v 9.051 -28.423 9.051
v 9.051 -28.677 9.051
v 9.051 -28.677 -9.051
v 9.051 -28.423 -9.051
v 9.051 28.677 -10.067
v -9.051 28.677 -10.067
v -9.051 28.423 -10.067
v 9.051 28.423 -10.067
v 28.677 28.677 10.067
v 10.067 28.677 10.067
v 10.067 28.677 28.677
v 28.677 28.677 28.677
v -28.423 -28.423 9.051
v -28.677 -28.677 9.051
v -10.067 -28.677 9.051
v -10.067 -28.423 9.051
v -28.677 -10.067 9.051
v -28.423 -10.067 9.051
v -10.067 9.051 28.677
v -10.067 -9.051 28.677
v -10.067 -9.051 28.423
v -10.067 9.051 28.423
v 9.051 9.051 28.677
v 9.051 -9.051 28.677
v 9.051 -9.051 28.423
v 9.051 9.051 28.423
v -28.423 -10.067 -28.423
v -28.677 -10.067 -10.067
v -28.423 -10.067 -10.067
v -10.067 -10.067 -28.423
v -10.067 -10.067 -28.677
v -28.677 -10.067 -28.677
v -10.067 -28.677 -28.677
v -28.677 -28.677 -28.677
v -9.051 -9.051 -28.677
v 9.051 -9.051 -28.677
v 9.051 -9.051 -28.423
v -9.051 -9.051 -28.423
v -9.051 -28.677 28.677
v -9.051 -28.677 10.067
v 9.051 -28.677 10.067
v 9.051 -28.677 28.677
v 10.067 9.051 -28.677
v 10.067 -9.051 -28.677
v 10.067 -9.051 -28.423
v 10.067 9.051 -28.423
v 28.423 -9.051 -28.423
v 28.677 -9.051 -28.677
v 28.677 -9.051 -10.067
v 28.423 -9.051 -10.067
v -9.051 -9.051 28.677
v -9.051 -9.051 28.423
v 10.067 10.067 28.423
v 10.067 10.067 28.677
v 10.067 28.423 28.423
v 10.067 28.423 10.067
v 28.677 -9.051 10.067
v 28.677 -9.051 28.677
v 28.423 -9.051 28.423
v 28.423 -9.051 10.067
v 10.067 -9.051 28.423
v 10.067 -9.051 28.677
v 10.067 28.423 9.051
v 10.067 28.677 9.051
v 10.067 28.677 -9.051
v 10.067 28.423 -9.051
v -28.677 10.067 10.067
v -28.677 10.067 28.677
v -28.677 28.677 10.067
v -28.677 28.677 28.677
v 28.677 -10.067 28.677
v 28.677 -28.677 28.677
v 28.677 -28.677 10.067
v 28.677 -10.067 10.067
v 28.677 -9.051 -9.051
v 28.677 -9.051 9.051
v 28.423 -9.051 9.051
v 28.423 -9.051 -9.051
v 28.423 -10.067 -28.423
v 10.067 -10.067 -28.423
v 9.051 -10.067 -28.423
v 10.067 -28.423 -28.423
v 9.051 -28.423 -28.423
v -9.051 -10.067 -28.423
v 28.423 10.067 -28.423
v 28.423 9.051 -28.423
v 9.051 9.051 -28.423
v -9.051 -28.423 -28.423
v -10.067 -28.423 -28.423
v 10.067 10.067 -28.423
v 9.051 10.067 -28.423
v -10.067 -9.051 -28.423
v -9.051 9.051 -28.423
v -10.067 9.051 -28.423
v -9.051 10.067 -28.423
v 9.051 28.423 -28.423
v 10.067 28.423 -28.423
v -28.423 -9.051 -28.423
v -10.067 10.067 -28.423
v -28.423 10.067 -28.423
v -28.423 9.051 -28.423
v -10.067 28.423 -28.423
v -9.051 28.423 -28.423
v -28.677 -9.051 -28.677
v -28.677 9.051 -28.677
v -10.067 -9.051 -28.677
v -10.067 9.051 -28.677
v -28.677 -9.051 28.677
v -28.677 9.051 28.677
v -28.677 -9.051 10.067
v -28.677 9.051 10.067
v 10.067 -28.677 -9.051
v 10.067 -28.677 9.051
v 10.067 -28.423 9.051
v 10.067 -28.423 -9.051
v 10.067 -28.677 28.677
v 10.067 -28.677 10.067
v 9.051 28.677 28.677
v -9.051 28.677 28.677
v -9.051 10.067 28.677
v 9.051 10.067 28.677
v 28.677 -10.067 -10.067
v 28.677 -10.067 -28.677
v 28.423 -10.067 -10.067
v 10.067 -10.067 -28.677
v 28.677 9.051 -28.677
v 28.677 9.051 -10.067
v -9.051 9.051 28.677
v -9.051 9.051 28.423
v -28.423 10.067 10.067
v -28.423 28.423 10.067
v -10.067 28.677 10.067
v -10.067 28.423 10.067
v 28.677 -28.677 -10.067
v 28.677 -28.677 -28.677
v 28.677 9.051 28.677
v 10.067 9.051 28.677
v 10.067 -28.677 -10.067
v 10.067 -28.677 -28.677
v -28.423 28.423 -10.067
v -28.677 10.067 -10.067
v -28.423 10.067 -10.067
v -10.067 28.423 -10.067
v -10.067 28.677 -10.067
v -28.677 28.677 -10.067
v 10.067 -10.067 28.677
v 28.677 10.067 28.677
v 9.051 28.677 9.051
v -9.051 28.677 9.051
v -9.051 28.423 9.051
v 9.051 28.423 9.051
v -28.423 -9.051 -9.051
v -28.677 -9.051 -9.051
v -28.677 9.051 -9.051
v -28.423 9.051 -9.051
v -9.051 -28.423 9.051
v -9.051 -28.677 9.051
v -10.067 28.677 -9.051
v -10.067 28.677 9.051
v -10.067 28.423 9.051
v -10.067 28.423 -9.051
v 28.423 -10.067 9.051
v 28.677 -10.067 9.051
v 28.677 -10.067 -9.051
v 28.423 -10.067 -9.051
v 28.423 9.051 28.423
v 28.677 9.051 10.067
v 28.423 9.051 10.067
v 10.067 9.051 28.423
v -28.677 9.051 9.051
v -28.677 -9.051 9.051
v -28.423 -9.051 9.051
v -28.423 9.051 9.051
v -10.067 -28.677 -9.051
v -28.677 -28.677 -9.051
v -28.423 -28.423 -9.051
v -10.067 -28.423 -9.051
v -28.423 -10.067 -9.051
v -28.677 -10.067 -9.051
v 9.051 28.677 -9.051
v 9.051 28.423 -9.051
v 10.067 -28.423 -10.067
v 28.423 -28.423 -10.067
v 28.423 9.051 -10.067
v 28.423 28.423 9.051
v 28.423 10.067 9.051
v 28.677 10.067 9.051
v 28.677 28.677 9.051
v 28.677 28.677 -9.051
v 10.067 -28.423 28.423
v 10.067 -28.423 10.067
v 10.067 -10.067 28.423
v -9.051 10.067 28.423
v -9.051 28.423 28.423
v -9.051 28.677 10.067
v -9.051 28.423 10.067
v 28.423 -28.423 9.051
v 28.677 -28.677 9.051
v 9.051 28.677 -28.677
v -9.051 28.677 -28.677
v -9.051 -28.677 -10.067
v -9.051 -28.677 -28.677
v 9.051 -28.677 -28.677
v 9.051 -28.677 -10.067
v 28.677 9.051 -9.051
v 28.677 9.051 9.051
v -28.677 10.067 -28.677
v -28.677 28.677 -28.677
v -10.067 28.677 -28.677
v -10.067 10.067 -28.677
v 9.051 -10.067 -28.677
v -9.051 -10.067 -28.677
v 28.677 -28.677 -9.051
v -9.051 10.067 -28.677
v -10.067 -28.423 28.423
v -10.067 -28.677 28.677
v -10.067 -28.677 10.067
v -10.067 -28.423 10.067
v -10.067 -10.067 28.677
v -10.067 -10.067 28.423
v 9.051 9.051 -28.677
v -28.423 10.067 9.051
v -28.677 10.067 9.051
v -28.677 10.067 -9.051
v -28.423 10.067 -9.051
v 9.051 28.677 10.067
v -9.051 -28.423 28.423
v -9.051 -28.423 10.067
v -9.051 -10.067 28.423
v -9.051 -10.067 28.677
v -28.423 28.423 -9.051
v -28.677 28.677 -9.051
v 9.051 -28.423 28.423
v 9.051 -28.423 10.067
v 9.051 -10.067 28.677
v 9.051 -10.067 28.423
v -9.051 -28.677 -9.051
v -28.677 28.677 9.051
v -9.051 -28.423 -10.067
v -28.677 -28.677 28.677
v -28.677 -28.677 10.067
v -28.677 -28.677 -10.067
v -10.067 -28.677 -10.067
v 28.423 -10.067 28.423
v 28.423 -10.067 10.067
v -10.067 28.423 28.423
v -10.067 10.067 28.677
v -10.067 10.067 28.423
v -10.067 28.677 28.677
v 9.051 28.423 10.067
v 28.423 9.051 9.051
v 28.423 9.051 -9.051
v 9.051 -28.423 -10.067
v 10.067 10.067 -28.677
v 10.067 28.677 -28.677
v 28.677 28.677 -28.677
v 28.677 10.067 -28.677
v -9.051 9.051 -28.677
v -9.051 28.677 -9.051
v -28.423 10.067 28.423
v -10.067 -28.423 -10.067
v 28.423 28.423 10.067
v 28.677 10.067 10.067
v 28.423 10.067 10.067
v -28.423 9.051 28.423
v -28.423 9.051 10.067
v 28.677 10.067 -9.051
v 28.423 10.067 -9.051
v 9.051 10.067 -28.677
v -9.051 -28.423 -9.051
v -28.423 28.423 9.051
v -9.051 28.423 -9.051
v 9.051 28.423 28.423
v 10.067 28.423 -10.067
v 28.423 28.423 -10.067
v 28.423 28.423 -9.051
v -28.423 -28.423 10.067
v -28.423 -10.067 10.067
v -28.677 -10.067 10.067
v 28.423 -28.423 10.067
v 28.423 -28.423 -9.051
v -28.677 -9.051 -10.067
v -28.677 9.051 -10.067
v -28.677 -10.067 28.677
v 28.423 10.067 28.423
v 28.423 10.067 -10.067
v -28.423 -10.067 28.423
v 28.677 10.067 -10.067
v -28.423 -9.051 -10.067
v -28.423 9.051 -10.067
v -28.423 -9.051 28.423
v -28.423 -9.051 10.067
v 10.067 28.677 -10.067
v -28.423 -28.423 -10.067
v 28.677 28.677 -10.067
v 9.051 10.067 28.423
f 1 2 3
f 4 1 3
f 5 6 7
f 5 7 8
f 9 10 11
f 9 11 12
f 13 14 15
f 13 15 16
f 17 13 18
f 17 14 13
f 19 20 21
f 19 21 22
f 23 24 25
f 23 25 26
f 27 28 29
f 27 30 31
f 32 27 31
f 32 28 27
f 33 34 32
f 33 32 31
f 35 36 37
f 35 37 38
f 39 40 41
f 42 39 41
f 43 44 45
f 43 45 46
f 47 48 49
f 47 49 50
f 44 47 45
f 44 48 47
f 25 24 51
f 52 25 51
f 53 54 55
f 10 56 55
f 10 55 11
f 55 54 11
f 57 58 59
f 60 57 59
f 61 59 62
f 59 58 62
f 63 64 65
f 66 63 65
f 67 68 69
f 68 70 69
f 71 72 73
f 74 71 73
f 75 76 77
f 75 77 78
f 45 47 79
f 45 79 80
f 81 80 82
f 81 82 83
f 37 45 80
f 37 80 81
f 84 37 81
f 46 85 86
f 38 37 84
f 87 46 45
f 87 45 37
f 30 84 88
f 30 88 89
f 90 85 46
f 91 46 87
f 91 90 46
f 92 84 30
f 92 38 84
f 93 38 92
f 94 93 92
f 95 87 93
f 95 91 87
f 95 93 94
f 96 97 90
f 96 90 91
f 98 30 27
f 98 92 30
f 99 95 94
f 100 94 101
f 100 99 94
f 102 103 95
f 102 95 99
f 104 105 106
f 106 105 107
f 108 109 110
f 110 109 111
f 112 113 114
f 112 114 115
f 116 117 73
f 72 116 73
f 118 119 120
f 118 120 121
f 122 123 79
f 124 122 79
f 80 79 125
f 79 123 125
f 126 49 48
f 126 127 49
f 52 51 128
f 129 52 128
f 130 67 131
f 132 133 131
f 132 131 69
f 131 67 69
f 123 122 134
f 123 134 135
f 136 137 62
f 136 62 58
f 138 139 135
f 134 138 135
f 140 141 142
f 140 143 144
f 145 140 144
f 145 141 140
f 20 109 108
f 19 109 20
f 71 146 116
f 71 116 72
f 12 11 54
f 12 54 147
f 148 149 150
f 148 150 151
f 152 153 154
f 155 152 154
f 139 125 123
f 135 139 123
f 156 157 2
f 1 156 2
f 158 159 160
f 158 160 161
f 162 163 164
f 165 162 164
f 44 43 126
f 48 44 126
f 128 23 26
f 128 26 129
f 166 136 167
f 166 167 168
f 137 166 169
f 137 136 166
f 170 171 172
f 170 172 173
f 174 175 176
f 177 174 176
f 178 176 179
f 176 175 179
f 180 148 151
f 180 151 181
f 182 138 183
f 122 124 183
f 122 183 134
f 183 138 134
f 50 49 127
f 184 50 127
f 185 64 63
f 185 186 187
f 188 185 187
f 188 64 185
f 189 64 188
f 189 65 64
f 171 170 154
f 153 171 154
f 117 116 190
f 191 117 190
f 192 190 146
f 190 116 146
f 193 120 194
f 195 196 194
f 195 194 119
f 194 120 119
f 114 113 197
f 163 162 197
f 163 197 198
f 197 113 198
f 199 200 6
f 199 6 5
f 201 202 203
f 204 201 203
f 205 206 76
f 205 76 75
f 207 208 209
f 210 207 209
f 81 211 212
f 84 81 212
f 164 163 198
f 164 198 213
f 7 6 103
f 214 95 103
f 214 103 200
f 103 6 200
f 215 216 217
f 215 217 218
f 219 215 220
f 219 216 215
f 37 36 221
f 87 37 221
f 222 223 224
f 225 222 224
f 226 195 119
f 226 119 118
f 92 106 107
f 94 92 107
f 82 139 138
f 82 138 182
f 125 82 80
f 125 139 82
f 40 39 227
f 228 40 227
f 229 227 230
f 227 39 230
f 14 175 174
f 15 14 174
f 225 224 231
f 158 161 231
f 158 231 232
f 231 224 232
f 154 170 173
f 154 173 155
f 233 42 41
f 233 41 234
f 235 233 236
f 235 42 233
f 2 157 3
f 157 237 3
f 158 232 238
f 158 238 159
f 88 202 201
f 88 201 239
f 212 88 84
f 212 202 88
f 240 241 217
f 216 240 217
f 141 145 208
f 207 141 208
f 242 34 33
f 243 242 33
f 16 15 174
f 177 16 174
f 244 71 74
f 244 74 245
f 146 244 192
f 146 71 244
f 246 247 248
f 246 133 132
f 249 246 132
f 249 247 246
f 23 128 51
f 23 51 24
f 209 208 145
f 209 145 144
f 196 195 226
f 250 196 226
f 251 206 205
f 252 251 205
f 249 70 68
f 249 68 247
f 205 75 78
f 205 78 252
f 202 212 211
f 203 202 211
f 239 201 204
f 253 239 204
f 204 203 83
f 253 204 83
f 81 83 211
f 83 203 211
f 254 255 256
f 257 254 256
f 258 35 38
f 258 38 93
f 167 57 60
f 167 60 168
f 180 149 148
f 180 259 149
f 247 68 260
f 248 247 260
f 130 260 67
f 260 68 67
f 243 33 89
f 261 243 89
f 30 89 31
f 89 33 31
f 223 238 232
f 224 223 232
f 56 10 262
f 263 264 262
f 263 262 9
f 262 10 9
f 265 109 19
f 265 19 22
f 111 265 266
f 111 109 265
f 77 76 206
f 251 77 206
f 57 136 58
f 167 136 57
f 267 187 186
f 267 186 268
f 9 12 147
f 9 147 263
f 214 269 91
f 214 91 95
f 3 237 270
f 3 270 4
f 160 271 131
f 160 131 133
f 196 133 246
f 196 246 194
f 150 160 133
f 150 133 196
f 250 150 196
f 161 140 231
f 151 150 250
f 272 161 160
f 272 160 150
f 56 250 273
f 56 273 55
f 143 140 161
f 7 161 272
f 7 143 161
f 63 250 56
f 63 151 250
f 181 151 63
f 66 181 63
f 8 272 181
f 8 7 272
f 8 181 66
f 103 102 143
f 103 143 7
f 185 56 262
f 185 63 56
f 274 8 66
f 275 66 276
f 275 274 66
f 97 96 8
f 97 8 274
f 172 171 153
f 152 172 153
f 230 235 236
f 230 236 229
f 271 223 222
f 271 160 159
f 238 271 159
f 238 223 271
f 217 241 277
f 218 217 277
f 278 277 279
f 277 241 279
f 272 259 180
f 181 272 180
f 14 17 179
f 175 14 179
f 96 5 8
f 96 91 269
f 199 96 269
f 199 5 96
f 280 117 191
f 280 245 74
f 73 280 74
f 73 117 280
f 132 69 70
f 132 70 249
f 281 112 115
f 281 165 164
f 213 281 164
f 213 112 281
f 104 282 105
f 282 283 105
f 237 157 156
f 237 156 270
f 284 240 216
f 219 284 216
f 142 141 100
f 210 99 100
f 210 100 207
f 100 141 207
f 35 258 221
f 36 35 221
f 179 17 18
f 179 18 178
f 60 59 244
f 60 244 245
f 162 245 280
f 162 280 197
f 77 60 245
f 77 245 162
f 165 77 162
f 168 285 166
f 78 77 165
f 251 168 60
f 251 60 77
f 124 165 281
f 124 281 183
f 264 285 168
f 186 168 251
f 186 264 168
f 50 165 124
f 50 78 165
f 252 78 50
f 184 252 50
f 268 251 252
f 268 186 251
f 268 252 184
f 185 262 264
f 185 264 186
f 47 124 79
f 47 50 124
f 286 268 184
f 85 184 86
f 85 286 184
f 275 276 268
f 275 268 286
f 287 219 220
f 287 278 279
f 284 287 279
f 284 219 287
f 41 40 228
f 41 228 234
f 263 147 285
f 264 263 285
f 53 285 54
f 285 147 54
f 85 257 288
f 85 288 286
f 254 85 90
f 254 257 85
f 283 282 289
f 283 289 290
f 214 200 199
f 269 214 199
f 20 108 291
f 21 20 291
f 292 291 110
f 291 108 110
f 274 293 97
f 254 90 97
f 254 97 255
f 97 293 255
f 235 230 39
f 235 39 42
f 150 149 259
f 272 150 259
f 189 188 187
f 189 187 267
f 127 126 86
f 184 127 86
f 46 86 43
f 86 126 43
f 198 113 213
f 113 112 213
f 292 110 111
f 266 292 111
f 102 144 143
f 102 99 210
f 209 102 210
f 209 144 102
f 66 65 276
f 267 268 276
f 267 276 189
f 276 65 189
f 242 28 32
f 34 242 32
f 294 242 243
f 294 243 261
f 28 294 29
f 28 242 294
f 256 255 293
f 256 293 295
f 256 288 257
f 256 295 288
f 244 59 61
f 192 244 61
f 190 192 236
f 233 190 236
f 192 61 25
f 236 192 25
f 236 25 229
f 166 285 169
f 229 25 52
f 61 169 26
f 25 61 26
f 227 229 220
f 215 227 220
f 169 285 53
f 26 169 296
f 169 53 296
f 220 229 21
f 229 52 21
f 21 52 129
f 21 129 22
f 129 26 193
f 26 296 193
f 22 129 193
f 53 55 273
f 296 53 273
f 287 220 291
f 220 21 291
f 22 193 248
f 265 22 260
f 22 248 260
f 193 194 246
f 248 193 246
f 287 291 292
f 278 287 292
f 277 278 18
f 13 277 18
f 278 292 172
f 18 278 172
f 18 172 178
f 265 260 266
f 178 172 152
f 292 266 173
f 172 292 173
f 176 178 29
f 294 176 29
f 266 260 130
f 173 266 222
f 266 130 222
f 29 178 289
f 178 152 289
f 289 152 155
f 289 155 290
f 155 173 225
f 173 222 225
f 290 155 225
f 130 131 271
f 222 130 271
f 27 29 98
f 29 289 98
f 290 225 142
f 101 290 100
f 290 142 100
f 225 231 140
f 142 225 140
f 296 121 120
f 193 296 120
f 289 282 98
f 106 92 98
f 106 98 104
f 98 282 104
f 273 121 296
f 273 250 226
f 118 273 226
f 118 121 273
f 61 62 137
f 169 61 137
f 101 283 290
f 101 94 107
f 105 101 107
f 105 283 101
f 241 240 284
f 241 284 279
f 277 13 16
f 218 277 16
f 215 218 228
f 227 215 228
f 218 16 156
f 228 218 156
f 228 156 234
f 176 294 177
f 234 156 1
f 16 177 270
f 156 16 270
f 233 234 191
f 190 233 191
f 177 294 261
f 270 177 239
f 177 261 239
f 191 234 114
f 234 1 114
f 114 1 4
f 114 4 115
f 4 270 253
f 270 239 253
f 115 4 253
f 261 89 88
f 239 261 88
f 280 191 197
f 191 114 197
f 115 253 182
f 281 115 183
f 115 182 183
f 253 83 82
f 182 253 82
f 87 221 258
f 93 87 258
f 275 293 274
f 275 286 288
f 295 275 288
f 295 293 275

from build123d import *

# Parameters (mm, degrees)
ESQUISSE1_W                     = 57.3532
ESQUISSE1_H                     = 57.3532
BOSS_EXTRU_1_DEPTH              = 28.6766
ESQUISSE2_W                     = 1.016
ESQUISSE2_H                     = 57.3532
ESQUISSE2_W_2                   = 57.3532
ESQUISSE2_H_2                   = 1.016
ENL_V_DE_MAT_EXTRU_MINCE1_DEPTH = 0.254
ESQUISSE3_W                     = 1.016
ESQUISSE3_H                     = 57.3532
ESQUISSE3_W_2                   = 57.3532
ESQUISSE3_H_2                   = 1.016
ENL_V_DE_MAT_EXTRU_MINCE2_DEPTH = 0.254
ESQUISSE4_W                     = 1.016
ESQUISSE4_H                     = 57.3532
ESQUISSE4_W_2                   = 57.3532
ESQUISSE4_H_2                   = 1.016
ENL_V_DE_MAT_EXTRU_MINCE3_DEPTH = 0.254


with BuildPart() as part:
    # Esquisse1 → Boss.-Extru.1 (new, symmetric)
    with BuildSketch(Plane(origin=(0, 0, 0), x_dir=(1, 0, 0), z_dir=(0, 1, 0))):
        Rectangle(ESQUISSE1_W, ESQUISSE1_H)
    extrude(amount=BOSS_EXTRU_1_DEPTH, both=True)

    # Esquisse2 → Enlèv. de mat.-Extru.-Mince1 (cut)
    with BuildSketch(Plane(origin=(0, 28.6766, 0), x_dir=(1, 0, 0), z_dir=(0, 1, 0))):
        with Locations((-9.558866667, 0)):
            Rectangle(ESQUISSE2_W, ESQUISSE2_H)
        with Locations((9.558866667, 0)):
            Rectangle(ESQUISSE2_W, ESQUISSE2_H)
        with Locations((0, 9.558866667)):
            Rectangle(ESQUISSE2_W_2, ESQUISSE2_H_2)
        with Locations((0, -9.558866667)):
            Rectangle(ESQUISSE2_W_2, ESQUISSE2_H_2)
    enl_v_de_mat_extru_mince1 = extrude(amount=-ENL_V_DE_MAT_EXTRU_MINCE1_DEPTH, mode=Mode.SUBTRACT)

    # Esquisse3 → Enlèv. de mat.-Extru.-Mince2 (cut)
    with BuildSketch(Plane(origin=(28.6766, 0, 0), x_dir=(0, 0, -1), z_dir=(1, 0, 0))):
        with Locations((-9.558866667, 0)):
            Rectangle(ESQUISSE3_W, ESQUISSE3_H)
        with Locations((9.558866667, 0)):
            Rectangle(ESQUISSE3_W, ESQUISSE3_H)
        with Locations((0, -9.558866667)):
            Rectangle(ESQUISSE3_W_2, ESQUISSE3_H_2)
        with Locations((0, 9.558866667)):
            Rectangle(ESQUISSE3_W_2, ESQUISSE3_H_2)
    enl_v_de_mat_extru_mince2 = extrude(amount=-ENL_V_DE_MAT_EXTRU_MINCE2_DEPTH, mode=Mode.SUBTRACT)

    # Esquisse4 → Enlèv. de mat.-Extru.-Mince3 (cut)
    with BuildSketch(Plane(origin=(0, 0, -28.6766), x_dir=(-1, 0, 0), z_dir=(0, 0, -1))):
        with Locations((-9.558866667, 0)):
            Rectangle(ESQUISSE4_W, ESQUISSE4_H)
        with Locations((9.558866667, 0)):
            Rectangle(ESQUISSE4_W, ESQUISSE4_H)
        with Locations((0, 9.558866667)):
            Rectangle(ESQUISSE4_W_2, ESQUISSE4_H_2)
        with Locations((0, -9.558866667)):
            Rectangle(ESQUISSE4_W_2, ESQUISSE4_H_2)
    enl_v_de_mat_extru_mince3 = extrude(amount=-ENL_V_DE_MAT_EXTRU_MINCE3_DEPTH, mode=Mode.SUBTRACT)

    # Symétrie1: Enlèv. de mat.-Extru.-Mince3 across plane
    add(enl_v_de_mat_extru_mince3.mirror(Plane.XY), mode=Mode.SUBTRACT)

    # Symétrie2: Enlèv. de mat.-Extru.-Mince1 across plane
    add(enl_v_de_mat_extru_mince1.mirror(Plane.ZX), mode=Mode.SUBTRACT)

    # Symétrie3: Enlèv. de mat.-Extru.-Mince2 across plane
    add(enl_v_de_mat_extru_mince2.mirror(Plane(origin=(0, 0, 0), x_dir=(0, 0, 1), z_dir=(1, 0, 0))), mode=Mode.SUBTRACT)


solid = part.part
